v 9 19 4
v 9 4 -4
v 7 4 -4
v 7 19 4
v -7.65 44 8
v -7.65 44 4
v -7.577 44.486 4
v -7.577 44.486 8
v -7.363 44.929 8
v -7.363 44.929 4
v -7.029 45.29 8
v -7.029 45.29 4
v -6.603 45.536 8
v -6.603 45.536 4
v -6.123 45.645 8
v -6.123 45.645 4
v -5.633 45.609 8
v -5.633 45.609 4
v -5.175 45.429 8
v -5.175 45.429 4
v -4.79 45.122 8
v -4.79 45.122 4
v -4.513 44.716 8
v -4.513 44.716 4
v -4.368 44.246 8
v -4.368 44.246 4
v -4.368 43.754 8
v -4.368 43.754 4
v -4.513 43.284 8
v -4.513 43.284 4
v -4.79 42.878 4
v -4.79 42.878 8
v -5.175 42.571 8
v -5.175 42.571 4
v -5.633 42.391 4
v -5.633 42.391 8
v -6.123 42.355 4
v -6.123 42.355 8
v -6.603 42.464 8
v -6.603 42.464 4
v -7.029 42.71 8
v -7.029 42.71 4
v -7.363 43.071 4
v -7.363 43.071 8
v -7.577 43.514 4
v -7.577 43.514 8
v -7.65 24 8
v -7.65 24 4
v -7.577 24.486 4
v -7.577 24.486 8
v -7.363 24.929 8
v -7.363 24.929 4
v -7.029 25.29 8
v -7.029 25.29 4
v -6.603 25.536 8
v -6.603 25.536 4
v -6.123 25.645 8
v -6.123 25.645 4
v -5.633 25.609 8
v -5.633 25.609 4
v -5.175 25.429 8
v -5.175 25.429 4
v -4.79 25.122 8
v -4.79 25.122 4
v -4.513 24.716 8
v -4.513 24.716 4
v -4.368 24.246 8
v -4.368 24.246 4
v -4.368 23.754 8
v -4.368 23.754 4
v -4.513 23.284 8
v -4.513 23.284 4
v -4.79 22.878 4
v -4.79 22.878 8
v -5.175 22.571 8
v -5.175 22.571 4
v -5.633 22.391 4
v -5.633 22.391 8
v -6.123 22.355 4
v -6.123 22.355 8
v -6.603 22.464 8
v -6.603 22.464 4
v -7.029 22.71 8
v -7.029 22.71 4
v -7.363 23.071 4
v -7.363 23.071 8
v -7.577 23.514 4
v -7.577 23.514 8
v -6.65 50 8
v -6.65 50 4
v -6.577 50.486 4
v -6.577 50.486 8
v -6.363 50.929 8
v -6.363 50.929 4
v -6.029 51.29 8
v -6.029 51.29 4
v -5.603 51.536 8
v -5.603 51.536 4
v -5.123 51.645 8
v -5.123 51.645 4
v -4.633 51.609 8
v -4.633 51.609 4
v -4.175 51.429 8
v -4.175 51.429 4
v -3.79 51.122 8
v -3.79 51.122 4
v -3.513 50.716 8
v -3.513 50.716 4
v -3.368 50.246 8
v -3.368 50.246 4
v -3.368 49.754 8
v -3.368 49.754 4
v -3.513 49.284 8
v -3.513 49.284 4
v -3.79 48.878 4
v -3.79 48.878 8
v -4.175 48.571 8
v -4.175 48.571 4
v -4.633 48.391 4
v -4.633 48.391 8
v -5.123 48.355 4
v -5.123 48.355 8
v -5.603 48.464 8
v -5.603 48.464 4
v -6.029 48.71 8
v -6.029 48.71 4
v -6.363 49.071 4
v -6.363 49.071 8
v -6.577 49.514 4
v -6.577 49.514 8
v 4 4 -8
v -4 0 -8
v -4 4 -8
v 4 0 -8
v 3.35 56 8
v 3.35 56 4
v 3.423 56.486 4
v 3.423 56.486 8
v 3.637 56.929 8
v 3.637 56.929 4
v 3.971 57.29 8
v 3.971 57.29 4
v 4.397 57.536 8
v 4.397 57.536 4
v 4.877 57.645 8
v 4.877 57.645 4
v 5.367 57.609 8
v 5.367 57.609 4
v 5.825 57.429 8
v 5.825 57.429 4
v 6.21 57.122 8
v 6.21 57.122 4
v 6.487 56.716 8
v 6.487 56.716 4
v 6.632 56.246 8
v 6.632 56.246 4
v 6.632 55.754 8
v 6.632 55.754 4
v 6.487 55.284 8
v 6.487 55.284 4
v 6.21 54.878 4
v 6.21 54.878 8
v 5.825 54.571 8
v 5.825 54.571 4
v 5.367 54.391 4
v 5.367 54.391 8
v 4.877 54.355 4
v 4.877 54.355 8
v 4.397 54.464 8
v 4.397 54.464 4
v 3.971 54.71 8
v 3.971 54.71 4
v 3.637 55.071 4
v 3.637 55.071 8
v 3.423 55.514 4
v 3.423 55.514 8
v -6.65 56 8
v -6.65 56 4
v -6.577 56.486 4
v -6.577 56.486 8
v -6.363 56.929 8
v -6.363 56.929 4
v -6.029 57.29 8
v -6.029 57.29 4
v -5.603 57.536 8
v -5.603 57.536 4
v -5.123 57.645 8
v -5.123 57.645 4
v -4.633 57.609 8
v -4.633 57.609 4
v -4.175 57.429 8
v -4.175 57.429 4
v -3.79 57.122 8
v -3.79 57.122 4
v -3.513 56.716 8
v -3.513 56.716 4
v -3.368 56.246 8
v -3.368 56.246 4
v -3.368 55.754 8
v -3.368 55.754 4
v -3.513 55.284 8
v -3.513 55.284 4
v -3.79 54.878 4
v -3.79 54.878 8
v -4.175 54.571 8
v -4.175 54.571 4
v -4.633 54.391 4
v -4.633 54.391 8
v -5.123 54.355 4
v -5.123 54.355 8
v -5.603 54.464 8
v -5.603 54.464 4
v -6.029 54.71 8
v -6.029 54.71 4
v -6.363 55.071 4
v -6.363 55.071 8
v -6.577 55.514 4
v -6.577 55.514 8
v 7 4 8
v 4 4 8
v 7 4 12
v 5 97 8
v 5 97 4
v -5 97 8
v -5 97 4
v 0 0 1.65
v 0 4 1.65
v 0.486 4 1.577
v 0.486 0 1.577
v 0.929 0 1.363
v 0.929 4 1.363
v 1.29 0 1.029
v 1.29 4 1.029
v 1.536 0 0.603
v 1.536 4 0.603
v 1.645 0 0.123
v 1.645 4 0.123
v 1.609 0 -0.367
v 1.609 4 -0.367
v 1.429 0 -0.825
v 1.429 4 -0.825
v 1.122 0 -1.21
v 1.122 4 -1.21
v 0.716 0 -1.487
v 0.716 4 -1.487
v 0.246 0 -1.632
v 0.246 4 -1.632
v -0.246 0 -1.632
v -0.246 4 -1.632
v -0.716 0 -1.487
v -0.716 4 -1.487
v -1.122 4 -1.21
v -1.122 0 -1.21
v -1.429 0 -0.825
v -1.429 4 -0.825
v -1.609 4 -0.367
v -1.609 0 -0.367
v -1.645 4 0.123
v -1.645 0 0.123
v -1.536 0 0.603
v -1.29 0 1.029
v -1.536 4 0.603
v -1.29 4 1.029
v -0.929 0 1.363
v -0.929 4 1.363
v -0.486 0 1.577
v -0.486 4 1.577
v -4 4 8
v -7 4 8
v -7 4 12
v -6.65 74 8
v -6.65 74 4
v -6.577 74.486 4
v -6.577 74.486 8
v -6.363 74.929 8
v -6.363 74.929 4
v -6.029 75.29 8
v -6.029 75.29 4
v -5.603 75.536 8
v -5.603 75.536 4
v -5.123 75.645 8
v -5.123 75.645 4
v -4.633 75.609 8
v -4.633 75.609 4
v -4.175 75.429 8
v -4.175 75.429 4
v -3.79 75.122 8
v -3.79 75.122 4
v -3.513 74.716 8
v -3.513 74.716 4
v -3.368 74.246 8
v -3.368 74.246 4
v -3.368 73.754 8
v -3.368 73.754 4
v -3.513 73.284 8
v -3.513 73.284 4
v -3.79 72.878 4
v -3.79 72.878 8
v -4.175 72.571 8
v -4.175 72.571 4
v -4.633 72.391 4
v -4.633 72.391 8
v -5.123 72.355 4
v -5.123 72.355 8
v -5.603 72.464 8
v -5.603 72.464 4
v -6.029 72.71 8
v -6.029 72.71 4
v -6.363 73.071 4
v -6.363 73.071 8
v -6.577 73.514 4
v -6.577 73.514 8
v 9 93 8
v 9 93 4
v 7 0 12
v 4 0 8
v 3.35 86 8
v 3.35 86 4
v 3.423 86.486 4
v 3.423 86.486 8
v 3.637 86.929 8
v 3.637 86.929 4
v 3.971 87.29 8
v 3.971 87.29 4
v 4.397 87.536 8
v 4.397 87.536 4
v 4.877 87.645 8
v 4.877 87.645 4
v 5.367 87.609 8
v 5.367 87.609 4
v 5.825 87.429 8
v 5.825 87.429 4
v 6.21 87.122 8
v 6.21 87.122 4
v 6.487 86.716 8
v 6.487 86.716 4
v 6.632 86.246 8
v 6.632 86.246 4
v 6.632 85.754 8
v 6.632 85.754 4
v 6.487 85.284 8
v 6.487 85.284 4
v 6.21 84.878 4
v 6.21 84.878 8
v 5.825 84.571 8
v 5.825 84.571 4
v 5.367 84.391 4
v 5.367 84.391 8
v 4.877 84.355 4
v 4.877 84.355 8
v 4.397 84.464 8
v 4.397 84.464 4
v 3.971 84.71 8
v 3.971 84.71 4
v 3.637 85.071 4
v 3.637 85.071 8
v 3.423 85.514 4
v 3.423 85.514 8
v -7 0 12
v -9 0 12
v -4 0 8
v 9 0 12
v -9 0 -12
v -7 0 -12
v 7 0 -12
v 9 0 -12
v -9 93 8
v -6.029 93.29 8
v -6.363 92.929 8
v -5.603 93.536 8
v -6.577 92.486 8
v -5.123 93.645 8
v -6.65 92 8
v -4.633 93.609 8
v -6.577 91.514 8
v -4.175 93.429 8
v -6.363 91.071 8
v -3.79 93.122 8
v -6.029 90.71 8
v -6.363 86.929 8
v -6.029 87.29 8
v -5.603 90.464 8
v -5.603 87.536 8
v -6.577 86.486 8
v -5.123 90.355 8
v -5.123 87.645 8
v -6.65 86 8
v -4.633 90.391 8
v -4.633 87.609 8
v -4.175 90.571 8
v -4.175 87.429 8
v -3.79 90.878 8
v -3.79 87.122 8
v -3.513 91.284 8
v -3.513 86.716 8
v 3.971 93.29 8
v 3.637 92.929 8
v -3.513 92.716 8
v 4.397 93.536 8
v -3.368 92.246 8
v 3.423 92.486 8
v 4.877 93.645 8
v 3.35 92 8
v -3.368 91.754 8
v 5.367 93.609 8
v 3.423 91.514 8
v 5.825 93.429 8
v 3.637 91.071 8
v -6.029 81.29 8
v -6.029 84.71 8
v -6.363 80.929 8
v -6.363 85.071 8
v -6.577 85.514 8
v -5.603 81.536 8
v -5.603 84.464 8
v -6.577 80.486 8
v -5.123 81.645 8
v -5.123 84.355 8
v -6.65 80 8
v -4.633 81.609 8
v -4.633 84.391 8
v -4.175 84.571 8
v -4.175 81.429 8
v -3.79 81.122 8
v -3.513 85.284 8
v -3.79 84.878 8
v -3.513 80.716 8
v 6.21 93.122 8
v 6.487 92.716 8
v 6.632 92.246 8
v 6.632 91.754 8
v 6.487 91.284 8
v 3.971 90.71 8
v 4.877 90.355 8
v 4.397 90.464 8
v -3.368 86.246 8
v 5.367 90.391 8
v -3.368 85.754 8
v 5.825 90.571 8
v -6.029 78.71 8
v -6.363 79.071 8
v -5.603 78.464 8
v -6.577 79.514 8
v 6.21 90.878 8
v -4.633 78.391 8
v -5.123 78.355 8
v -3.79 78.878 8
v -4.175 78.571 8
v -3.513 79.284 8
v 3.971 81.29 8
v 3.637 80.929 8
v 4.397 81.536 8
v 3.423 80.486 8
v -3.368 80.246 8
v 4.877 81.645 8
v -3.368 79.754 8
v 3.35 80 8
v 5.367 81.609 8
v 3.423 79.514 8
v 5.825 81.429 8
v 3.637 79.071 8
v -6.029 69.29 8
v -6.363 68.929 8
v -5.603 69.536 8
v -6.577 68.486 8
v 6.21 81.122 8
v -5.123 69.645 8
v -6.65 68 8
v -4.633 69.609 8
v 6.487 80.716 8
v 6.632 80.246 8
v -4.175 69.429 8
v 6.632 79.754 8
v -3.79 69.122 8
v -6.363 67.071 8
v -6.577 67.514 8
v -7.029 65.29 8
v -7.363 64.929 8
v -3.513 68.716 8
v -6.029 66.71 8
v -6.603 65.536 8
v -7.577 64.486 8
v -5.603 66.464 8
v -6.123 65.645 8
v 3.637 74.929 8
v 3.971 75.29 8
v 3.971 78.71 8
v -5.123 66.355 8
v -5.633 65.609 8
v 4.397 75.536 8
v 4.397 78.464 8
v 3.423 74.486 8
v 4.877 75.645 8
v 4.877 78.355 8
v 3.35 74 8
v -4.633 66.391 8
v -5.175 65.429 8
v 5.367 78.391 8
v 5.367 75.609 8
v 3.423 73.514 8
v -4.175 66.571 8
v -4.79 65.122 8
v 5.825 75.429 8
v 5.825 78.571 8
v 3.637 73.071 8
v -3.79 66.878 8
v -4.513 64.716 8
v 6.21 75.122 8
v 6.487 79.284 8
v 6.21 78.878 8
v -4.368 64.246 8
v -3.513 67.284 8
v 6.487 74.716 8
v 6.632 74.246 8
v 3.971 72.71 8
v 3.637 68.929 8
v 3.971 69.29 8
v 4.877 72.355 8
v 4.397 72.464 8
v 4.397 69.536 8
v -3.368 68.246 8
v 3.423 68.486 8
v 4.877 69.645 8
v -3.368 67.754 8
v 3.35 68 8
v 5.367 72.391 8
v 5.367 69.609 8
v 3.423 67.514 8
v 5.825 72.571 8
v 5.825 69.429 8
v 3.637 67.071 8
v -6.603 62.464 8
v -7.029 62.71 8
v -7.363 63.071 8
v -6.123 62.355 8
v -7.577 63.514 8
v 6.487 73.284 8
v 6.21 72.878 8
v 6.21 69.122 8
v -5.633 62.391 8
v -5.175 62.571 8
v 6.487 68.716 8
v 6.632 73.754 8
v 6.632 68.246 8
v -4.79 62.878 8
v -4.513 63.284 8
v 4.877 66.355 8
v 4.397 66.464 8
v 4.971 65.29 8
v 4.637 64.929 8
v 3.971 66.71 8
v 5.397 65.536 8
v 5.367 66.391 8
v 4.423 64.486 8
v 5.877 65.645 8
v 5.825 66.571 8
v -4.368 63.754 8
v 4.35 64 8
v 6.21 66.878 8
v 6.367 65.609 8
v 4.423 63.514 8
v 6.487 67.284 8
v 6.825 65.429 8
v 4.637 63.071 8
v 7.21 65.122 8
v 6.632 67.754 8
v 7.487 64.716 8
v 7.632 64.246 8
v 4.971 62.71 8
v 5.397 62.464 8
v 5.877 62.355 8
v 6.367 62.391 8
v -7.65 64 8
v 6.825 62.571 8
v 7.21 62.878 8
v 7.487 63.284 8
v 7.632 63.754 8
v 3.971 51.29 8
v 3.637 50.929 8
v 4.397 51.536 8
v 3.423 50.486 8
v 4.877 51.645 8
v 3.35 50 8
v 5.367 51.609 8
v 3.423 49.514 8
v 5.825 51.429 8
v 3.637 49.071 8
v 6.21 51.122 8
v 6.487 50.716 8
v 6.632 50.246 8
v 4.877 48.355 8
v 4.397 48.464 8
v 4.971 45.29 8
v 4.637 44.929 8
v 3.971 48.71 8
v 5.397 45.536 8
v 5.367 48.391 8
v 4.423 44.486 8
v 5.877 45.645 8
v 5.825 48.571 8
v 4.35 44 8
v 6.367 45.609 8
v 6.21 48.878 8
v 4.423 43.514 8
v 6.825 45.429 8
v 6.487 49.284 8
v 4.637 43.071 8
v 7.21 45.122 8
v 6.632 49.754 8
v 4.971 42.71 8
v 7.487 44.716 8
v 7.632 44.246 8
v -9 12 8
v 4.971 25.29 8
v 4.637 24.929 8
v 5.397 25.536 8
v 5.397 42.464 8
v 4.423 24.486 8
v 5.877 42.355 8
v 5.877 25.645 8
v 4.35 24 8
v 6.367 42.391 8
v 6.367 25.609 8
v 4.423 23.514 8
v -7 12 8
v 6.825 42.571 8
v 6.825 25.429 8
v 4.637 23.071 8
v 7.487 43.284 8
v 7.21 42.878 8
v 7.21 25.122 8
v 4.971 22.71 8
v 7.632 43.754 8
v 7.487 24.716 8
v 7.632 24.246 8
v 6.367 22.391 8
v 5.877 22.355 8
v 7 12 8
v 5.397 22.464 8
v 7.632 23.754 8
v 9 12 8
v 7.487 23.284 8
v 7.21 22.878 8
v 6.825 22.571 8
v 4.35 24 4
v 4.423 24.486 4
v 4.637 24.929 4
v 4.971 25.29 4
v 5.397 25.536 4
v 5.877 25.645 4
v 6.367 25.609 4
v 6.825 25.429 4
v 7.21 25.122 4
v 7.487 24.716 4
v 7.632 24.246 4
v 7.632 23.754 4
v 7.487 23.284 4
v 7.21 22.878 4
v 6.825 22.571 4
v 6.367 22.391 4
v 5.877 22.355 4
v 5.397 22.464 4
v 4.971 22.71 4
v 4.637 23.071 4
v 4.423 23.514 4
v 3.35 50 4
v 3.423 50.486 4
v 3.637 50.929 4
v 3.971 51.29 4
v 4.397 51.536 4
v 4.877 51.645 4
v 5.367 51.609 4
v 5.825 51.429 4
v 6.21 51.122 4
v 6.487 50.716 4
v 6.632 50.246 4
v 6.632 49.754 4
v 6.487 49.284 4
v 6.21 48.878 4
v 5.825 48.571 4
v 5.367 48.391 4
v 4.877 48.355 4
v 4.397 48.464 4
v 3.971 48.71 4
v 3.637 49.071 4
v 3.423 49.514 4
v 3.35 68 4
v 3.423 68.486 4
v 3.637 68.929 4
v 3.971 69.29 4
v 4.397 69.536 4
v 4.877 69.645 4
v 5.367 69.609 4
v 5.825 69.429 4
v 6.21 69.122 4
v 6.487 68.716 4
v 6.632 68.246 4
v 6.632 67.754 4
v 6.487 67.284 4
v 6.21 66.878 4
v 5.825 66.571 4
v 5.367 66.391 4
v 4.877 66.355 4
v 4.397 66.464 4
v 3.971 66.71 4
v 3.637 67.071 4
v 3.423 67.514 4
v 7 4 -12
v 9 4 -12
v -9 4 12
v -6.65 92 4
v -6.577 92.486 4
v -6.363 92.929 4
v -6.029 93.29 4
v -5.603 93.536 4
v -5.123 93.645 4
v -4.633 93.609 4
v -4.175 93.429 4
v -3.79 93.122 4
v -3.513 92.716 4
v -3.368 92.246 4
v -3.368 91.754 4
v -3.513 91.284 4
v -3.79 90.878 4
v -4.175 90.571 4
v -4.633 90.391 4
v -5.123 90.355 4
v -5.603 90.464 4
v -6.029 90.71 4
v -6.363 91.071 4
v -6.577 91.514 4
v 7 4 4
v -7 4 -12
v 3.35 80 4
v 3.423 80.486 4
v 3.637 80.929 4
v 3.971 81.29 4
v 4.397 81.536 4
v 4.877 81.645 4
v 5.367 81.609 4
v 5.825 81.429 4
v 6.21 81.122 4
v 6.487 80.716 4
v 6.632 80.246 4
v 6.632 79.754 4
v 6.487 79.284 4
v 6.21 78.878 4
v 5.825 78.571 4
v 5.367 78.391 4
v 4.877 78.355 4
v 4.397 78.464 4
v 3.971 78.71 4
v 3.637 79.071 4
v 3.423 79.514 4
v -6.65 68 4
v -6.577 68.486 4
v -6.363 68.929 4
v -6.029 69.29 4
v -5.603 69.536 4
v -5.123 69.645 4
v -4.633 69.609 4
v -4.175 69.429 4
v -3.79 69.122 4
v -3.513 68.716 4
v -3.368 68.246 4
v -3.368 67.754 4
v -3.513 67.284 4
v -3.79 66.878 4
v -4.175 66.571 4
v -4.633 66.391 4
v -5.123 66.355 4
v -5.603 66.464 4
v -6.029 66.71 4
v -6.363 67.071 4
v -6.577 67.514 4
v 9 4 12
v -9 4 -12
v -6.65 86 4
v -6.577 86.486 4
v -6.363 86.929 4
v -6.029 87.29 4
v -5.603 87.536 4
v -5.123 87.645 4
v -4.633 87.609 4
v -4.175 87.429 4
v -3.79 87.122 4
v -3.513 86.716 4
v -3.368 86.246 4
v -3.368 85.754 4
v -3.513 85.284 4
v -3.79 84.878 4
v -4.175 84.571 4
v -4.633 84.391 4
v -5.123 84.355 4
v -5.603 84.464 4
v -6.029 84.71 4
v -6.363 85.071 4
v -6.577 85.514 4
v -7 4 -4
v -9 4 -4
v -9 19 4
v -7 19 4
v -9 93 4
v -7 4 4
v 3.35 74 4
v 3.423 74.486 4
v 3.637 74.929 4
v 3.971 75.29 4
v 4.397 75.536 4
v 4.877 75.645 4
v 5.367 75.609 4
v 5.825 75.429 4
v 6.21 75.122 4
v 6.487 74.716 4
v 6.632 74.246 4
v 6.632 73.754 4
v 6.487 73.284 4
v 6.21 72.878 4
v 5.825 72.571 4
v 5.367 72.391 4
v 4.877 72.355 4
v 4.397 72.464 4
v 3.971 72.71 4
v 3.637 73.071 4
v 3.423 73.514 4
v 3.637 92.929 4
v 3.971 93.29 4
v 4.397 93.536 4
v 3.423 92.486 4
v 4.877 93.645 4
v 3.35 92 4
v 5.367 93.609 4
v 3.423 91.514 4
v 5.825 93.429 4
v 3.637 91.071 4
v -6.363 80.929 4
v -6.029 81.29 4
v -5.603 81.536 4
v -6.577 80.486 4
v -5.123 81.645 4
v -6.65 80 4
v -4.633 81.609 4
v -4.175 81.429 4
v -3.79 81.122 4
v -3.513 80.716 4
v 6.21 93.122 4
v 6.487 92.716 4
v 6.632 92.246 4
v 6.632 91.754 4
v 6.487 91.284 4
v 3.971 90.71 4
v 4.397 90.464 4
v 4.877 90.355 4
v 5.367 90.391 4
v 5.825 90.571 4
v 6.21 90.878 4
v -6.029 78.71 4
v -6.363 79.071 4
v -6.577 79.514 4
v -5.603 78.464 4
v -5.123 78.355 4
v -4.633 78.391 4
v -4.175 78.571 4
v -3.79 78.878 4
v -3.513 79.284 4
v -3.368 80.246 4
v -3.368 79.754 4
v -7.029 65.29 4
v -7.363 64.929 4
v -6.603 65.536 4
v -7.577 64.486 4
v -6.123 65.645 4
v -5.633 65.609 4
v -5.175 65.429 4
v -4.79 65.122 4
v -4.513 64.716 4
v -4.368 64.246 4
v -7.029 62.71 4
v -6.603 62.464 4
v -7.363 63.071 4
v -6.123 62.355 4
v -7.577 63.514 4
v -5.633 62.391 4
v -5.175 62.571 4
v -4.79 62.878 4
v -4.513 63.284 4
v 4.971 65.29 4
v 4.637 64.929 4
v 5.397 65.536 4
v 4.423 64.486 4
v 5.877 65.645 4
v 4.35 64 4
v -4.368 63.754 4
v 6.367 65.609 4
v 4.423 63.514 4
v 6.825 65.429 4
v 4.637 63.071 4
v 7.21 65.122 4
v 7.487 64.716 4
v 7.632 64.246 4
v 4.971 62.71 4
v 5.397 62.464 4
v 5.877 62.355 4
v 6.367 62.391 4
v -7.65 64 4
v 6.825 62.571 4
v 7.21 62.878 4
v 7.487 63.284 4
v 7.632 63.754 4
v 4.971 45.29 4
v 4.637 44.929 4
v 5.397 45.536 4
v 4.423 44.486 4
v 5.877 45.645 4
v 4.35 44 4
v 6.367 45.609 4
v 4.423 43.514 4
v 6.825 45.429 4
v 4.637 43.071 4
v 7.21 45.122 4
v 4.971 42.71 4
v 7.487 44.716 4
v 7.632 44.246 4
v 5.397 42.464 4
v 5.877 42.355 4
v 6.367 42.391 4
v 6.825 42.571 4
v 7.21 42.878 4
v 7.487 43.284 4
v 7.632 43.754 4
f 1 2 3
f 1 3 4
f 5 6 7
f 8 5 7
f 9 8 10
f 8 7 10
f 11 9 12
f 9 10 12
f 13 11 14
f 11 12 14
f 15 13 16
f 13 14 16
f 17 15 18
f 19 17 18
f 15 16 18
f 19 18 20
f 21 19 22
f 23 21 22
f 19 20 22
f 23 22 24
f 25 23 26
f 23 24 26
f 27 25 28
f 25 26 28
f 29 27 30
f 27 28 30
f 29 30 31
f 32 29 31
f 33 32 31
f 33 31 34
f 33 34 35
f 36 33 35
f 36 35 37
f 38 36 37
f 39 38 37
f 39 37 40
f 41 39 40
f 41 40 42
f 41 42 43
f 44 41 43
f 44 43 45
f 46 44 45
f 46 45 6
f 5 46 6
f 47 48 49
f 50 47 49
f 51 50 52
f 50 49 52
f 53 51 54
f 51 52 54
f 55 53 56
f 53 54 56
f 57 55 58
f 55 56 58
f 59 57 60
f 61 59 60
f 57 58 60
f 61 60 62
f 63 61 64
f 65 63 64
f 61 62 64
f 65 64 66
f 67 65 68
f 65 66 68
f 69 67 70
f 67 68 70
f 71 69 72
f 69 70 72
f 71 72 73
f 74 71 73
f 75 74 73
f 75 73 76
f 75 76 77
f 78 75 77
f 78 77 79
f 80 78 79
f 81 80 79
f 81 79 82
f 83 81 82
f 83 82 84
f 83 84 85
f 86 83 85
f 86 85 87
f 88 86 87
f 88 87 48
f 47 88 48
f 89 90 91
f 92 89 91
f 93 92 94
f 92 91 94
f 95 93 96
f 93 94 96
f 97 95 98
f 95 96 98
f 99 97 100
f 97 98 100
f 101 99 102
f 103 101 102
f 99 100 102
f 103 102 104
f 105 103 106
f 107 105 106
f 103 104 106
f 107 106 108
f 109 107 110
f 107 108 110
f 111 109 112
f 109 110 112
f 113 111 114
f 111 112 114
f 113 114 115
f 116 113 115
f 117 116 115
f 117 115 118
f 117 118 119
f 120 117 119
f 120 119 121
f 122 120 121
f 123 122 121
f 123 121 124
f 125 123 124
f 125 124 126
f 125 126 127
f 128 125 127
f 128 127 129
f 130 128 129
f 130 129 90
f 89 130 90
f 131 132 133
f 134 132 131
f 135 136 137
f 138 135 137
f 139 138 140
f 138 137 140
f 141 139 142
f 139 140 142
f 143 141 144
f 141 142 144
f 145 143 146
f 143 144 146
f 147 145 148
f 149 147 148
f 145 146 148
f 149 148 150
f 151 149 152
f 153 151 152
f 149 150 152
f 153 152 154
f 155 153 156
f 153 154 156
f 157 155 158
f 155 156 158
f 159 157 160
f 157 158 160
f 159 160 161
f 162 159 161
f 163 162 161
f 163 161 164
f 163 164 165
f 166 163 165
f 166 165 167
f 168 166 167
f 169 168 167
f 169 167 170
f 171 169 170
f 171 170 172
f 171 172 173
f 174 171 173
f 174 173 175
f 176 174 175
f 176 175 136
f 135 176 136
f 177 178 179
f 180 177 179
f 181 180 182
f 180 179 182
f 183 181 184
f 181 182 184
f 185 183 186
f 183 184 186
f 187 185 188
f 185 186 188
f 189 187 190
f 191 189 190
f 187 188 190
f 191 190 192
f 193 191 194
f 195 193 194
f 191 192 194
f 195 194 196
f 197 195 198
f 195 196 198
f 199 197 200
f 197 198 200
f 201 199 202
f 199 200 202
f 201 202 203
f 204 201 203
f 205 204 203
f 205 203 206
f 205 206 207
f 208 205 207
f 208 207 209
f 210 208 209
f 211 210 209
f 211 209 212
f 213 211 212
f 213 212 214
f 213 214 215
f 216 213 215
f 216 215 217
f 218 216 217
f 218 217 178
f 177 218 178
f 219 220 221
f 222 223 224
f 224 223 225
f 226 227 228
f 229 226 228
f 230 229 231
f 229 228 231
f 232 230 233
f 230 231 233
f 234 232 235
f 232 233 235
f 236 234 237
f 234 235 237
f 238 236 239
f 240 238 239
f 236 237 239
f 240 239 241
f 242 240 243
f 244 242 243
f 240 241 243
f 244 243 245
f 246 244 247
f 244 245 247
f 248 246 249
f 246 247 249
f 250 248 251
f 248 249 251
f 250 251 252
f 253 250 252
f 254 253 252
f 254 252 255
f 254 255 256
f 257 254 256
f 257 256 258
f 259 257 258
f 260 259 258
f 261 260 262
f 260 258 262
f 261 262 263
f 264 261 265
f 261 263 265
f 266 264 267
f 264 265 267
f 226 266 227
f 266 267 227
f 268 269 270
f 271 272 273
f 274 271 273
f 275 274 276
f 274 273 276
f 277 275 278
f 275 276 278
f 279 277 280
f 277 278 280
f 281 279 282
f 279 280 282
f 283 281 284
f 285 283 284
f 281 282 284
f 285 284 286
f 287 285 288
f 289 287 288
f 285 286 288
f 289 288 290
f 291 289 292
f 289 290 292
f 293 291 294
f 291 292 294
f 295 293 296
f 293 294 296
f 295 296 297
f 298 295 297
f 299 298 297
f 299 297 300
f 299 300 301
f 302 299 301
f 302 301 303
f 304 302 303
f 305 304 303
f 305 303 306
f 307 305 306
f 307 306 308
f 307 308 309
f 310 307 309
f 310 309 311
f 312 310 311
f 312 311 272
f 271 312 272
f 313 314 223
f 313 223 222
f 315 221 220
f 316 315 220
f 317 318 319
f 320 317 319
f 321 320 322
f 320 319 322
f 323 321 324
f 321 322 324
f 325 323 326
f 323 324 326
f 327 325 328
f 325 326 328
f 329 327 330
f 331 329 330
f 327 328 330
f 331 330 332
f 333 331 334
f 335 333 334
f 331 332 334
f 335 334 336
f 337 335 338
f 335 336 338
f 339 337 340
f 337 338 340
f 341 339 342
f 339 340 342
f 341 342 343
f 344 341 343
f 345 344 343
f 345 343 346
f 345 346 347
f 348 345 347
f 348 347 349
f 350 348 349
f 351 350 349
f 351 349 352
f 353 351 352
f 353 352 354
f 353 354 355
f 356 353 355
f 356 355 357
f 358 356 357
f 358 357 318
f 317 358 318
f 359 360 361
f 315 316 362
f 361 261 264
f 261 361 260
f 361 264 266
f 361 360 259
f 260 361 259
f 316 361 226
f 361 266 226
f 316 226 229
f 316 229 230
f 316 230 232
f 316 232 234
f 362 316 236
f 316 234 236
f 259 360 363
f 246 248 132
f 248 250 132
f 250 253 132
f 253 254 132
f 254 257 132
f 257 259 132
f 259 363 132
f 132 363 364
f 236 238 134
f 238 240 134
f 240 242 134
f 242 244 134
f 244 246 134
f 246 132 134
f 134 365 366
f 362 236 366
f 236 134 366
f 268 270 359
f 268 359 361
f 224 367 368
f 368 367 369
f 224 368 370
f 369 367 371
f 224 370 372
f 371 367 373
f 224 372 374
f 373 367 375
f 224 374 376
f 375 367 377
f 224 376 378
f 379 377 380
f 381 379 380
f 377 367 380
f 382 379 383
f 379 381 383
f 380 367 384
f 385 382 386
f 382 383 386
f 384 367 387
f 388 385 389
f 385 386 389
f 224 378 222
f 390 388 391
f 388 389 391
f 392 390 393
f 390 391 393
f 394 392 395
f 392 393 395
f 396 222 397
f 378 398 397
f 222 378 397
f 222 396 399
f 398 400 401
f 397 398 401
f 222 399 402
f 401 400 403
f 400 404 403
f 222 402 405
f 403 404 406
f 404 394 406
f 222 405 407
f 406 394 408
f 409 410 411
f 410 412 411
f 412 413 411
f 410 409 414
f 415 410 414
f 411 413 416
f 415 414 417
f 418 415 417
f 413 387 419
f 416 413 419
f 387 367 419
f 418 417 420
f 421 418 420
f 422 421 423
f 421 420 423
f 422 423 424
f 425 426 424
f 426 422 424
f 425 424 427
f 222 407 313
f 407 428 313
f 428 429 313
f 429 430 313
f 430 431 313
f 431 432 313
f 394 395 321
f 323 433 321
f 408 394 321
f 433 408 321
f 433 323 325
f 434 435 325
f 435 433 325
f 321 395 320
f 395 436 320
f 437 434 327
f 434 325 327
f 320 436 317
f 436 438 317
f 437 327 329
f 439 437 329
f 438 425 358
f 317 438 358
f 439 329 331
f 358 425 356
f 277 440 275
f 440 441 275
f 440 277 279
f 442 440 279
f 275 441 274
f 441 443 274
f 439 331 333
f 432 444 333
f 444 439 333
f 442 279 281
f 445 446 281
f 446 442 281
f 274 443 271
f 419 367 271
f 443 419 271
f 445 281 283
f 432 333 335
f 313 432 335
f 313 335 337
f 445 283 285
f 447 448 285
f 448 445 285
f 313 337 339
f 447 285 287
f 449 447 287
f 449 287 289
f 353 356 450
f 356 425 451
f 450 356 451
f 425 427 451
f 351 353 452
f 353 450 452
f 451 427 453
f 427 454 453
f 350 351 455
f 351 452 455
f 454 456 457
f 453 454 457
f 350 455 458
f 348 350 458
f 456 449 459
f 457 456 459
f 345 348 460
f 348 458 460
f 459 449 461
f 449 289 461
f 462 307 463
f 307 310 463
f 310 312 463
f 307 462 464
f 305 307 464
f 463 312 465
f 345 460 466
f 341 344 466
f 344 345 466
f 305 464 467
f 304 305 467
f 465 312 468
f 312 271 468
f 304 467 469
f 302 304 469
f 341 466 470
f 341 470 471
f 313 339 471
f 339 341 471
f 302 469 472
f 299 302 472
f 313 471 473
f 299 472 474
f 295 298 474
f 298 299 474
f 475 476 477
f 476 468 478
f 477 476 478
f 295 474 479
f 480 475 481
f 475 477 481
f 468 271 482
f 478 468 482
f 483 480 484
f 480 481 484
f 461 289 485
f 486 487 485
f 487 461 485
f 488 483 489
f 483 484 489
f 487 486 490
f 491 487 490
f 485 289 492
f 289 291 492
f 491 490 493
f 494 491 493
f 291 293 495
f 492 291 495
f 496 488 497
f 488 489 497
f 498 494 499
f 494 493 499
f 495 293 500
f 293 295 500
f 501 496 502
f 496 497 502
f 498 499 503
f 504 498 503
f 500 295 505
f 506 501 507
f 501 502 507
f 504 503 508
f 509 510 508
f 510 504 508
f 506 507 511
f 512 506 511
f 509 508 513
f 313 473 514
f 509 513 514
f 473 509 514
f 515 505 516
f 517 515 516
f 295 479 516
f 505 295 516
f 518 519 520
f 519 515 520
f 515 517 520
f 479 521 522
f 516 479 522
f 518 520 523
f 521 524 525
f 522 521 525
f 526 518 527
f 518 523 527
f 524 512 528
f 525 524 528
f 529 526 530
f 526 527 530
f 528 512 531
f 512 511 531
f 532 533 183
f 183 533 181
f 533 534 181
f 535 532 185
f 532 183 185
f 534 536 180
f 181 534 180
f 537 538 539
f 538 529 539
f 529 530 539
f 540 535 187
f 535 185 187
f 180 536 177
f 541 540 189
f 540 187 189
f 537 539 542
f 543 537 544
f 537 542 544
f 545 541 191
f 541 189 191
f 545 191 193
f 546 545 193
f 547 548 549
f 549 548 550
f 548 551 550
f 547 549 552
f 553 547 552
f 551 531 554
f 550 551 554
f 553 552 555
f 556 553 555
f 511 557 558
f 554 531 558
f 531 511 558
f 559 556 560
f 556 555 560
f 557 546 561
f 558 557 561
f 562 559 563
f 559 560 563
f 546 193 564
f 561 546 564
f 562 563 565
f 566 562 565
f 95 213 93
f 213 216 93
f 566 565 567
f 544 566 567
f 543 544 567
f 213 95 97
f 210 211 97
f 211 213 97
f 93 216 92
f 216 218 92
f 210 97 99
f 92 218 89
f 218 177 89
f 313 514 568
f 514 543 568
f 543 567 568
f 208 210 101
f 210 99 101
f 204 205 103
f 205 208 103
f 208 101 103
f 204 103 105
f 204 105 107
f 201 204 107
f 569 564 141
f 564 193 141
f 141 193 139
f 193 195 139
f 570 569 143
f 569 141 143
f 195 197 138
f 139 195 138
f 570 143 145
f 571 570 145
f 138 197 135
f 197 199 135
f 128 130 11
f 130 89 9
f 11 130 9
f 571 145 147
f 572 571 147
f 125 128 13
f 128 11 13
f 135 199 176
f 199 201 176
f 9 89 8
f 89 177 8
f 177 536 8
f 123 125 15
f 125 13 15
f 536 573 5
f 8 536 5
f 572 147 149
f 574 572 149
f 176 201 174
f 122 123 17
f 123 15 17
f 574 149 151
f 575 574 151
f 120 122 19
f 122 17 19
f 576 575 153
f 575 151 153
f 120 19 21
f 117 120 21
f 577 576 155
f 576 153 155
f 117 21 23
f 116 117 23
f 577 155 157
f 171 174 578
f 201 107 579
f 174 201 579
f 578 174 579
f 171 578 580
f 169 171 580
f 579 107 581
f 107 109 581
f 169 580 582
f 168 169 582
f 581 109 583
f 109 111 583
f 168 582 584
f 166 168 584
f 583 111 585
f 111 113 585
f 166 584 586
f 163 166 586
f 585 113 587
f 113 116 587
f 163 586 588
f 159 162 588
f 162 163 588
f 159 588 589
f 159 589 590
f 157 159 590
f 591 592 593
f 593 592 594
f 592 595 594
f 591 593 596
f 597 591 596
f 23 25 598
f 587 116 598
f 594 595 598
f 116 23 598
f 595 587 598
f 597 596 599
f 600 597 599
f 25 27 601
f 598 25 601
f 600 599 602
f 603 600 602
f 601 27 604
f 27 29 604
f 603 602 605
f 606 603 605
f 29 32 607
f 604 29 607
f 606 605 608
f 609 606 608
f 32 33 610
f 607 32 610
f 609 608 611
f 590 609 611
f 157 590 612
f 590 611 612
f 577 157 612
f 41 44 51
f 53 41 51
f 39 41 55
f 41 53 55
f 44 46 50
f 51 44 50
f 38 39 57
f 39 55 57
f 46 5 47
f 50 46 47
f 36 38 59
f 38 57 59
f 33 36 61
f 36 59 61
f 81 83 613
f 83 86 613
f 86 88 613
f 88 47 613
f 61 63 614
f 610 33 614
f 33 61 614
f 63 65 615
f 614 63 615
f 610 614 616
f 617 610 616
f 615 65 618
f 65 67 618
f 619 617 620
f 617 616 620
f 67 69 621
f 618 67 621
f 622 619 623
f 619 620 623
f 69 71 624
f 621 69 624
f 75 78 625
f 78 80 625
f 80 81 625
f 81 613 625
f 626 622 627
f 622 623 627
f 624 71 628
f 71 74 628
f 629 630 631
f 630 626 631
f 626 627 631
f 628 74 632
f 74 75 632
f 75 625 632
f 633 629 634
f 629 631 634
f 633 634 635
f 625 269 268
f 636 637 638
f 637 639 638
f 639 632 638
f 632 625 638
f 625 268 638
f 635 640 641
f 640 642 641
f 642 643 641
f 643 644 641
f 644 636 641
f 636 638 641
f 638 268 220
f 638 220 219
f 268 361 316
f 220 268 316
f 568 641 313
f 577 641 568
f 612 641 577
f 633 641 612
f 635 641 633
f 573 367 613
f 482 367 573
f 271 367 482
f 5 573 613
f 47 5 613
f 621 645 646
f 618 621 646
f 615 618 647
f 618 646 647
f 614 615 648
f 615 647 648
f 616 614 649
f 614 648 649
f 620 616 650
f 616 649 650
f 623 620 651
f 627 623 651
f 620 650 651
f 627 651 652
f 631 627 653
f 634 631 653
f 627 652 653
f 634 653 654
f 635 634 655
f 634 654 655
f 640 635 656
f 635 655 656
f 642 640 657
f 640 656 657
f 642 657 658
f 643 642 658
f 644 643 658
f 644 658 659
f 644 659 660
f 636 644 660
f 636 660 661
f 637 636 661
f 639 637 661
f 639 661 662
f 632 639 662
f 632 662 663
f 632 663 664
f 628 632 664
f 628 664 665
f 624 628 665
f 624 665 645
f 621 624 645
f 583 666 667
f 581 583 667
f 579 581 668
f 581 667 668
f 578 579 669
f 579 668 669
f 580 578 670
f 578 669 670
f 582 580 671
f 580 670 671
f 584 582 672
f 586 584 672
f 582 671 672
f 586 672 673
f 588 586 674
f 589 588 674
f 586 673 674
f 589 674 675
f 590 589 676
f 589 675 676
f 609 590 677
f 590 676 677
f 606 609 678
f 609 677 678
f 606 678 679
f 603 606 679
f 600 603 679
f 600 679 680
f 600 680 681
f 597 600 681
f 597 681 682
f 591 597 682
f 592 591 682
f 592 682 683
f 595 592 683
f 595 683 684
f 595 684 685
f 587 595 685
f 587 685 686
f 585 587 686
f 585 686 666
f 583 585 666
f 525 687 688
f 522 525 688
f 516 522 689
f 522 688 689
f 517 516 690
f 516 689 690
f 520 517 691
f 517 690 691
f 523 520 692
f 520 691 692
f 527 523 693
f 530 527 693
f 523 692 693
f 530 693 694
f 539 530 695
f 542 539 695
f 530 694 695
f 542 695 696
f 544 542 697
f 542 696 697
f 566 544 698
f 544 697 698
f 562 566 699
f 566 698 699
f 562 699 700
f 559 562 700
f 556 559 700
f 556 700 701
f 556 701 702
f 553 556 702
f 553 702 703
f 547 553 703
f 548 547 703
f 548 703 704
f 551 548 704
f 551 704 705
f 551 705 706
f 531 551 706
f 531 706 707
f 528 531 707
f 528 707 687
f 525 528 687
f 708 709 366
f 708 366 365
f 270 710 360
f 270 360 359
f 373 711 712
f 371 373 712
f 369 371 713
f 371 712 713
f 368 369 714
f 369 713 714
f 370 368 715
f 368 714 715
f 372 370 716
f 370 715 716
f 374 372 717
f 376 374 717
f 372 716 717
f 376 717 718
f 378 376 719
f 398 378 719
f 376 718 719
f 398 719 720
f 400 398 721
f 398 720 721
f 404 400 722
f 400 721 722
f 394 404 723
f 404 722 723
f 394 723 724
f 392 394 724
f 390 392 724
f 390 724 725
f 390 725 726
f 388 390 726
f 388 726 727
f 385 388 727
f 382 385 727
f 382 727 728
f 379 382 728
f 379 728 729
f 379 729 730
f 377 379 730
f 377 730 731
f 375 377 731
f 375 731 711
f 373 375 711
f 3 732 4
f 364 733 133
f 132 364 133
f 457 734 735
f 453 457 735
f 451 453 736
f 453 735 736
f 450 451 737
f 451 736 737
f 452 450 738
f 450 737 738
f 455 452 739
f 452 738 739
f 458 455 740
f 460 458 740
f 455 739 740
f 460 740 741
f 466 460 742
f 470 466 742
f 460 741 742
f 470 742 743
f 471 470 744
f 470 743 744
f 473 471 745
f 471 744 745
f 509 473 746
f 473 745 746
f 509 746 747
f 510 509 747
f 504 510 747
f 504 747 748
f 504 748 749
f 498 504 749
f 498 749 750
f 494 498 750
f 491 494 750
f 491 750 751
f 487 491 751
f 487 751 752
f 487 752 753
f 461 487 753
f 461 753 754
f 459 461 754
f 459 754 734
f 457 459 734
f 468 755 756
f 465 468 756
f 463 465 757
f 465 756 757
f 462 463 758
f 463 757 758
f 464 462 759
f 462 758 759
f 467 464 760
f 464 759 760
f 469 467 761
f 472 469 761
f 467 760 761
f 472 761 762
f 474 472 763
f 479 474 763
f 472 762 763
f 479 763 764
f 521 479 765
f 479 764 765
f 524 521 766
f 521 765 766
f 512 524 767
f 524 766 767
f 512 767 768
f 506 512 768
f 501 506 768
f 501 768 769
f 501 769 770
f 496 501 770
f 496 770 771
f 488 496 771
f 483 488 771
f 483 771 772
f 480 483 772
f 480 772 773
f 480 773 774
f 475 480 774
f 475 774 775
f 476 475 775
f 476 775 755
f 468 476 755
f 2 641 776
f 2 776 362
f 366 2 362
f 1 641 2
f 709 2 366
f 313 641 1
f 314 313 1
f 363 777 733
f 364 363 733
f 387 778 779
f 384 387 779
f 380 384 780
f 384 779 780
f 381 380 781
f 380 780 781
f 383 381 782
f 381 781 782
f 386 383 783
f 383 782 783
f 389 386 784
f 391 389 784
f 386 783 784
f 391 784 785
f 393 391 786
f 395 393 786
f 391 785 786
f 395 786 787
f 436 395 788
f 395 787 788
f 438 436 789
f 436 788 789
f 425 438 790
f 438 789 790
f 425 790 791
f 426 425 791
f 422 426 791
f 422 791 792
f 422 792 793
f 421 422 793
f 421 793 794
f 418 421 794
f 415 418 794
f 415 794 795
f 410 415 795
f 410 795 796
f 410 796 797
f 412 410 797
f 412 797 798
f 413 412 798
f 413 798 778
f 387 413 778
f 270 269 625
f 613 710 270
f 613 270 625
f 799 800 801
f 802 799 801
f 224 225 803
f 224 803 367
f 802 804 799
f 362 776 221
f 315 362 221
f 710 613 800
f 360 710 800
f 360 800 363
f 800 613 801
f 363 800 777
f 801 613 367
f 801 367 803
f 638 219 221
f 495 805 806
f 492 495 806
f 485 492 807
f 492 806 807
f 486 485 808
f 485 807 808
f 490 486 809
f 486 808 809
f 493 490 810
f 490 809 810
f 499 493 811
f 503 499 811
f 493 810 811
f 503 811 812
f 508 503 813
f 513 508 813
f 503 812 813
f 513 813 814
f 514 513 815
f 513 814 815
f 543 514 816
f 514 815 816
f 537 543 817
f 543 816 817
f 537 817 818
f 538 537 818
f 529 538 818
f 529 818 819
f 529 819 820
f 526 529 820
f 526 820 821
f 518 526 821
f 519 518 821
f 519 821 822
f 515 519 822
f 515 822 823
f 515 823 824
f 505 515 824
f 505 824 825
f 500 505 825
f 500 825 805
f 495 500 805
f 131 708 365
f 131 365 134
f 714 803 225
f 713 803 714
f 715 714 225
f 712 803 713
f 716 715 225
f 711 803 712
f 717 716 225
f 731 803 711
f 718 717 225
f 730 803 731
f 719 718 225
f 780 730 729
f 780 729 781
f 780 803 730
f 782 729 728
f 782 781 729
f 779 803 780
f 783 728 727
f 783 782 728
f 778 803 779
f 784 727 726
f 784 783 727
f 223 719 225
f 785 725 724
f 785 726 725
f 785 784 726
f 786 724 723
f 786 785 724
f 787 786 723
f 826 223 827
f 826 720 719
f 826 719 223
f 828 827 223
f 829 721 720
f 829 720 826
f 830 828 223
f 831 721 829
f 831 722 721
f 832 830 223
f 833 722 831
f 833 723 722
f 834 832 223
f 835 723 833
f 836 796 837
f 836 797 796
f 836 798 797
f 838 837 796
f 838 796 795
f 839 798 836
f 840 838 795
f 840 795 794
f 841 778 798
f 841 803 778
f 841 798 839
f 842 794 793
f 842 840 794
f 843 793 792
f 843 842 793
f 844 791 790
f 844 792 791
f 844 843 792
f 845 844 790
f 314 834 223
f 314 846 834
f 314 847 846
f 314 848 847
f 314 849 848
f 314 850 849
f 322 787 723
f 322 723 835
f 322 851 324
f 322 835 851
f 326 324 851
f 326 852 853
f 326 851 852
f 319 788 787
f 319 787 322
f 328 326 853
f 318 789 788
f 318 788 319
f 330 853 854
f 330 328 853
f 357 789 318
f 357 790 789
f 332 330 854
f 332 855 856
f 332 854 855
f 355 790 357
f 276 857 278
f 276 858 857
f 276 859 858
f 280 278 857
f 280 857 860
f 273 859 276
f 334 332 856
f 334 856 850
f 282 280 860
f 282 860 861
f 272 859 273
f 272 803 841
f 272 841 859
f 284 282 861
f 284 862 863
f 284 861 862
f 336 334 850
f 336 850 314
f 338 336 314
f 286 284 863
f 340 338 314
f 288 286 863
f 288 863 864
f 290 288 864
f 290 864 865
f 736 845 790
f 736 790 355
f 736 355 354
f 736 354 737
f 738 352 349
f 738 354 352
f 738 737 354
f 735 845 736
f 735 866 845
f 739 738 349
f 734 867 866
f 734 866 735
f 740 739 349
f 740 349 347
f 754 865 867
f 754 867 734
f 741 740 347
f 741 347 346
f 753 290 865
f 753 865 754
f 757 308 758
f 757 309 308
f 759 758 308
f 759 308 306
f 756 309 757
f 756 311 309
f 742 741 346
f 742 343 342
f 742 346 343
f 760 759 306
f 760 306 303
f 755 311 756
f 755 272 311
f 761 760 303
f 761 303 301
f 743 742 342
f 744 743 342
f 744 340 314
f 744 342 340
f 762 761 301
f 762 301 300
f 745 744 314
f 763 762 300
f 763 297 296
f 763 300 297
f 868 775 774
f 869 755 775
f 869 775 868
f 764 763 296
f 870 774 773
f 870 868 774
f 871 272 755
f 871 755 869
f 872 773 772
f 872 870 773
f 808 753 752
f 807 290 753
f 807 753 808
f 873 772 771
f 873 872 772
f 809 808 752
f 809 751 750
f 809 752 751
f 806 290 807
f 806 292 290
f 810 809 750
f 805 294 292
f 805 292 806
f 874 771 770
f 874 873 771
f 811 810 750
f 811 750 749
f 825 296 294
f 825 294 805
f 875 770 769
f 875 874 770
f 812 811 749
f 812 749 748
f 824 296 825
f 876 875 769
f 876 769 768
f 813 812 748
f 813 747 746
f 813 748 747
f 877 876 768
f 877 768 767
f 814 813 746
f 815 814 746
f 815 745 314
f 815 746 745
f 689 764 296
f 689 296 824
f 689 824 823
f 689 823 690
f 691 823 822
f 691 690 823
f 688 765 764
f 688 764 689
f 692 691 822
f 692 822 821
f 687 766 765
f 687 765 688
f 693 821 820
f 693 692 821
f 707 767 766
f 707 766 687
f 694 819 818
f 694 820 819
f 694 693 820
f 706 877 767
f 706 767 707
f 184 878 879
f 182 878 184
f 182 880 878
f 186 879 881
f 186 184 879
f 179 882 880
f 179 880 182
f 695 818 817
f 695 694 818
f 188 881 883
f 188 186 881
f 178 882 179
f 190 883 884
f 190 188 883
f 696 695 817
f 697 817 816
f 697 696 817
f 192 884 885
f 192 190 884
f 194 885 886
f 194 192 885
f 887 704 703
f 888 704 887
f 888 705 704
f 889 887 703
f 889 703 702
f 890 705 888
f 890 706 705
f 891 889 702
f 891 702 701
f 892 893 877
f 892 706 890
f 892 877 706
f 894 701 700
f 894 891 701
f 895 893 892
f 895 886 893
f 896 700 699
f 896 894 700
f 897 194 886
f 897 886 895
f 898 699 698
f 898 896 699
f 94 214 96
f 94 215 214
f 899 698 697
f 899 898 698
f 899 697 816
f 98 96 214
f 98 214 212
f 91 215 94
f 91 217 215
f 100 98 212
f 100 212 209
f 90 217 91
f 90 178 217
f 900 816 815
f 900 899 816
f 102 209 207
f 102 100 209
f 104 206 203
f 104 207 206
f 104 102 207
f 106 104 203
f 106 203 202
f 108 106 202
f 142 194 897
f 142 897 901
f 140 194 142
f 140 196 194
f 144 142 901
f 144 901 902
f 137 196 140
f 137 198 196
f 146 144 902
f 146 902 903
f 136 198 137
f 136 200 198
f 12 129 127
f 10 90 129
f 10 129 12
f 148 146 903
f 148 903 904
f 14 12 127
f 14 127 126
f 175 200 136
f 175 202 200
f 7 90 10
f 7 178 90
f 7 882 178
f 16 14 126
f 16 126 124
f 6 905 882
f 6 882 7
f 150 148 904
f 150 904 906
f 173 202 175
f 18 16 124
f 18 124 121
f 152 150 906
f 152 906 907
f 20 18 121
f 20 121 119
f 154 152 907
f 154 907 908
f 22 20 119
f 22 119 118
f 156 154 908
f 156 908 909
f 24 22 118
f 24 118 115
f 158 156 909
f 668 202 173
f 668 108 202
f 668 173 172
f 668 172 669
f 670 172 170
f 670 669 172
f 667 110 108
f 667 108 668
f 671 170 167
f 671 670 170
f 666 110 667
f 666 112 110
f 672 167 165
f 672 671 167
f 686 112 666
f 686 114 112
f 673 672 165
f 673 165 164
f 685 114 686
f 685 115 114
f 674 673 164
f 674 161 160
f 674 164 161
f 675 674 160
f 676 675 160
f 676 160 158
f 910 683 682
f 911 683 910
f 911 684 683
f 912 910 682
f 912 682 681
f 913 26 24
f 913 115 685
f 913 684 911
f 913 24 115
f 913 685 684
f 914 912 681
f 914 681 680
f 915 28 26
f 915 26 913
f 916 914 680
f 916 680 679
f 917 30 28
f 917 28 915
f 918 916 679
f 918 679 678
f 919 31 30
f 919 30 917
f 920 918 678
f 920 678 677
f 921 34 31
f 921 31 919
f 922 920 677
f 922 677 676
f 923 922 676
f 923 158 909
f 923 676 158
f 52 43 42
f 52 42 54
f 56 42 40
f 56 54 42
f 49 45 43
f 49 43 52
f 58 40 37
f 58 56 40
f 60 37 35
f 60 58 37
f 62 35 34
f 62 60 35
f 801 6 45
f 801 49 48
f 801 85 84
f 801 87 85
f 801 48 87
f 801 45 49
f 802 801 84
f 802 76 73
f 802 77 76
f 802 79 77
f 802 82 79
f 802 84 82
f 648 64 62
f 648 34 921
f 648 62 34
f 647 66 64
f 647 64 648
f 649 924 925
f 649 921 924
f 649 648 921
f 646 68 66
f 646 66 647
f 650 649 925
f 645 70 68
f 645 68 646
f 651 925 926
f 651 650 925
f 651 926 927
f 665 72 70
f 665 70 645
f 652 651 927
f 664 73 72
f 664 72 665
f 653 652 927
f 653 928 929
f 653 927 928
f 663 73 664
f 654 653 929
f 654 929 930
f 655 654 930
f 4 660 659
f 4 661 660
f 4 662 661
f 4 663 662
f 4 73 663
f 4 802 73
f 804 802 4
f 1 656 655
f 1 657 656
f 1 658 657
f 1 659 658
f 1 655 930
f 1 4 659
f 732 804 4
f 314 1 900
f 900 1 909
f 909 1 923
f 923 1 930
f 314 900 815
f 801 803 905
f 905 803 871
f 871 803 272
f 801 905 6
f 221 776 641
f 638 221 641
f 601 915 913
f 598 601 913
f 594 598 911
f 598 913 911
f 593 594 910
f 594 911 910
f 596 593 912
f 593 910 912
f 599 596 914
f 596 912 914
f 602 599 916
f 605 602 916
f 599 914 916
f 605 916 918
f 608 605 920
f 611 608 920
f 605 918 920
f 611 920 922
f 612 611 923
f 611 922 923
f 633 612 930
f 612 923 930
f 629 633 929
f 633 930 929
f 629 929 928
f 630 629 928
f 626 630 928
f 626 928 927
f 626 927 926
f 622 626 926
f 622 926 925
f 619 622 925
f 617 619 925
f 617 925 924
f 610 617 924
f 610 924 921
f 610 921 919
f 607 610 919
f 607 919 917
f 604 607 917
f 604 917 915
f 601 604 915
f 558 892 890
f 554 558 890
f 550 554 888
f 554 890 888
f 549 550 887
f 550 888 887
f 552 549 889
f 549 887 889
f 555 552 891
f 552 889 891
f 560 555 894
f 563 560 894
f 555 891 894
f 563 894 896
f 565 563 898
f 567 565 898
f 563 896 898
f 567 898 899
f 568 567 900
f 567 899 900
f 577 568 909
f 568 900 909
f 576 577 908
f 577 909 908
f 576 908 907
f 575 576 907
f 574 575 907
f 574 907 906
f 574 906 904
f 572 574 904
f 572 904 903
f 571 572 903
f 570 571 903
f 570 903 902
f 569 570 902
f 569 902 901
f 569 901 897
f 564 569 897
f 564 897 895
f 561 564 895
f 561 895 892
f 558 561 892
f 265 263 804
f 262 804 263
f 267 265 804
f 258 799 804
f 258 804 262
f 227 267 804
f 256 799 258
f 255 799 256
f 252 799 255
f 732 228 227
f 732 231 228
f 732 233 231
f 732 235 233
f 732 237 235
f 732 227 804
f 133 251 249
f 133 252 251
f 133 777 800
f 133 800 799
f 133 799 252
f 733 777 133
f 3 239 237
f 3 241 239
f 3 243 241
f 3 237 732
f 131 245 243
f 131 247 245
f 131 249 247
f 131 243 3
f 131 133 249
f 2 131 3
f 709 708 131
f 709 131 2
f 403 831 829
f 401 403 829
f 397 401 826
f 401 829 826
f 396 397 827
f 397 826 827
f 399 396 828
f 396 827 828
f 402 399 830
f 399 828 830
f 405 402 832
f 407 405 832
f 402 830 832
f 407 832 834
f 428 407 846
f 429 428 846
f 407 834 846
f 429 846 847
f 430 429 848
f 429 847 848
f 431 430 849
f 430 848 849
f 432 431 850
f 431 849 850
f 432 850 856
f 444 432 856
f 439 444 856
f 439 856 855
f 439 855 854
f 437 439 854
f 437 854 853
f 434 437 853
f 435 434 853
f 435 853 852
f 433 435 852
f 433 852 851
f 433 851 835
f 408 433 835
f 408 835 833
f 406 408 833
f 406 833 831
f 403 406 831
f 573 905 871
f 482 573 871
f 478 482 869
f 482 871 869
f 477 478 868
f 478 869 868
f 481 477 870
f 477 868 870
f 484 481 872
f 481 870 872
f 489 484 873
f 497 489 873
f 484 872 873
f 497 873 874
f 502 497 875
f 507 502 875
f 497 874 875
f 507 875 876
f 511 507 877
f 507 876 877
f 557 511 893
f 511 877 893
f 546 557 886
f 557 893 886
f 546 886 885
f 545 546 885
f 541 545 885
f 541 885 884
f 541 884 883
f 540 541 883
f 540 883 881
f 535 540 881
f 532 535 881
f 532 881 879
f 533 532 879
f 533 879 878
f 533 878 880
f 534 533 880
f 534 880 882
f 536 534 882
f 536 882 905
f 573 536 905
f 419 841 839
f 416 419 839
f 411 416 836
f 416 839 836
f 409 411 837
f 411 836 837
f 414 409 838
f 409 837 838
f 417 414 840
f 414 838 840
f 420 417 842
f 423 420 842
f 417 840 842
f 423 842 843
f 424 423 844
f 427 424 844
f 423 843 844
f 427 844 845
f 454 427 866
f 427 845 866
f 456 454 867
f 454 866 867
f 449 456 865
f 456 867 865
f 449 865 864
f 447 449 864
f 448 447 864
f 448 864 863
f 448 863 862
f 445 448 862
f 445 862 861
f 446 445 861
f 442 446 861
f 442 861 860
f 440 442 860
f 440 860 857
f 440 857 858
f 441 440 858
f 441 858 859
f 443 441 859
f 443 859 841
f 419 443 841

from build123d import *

# Parameters (mm, degrees)
SKETCH_1_W          = 18
SKETCH_1_H          = 16
EXTRUDE_1_DEPTH     = 4
SKETCH_2_R          = 1.65
CUT_EXTRUDE_1_DEPTH = 4
EXTRUDE_2_DEPTH     = 4
SKETCH_4_W          = 18
SKETCH_4_H          = 4
EXTRUDE_3_DEPTH     = 100
EXTRUDE_4_DEPTH     = 2
SKETCH_6_R          = 1.65
CUT_EXTRUDE_2_DEPTH = 10
SKETCH_7_W          = 18
SKETCH_7_H          = 7
CUT_EXTRUDE_3_DEPTH = 10
CHAMFER_1_SIZE      = 4


with BuildPart() as part:
    # 草图1 → 凸台-拉伸1 (new body)
    with BuildSketch(Plane(origin=(0, 0, 0), x_dir=(1, 0, 0), z_dir=(0, 1, 0))):
        Rectangle(SKETCH_1_W, SKETCH_1_H)
    extrude(amount=EXTRUDE_1_DEPTH)

    # 草图2 → 切除-拉伸1 (cut)
    with BuildSketch(Plane(origin=(0, 4, 0), x_dir=(1, 0, 0), z_dir=(0, 1, 0))):
        with Locations(Location((0, 0, 0), (0, 0, 270))):
            Circle(SKETCH_2_R)
    extrude(amount=-CUT_EXTRUDE_1_DEPTH, mode=Mode.SUBTRACT)

    # 草图3 → 凸台-拉伸2 (add)
    with BuildSketch(Plane(origin=(0, 4, 0), x_dir=(1, 0, 0), z_dir=(0, 1, 0))):
        Polygon((-9, -8), (-9, -12), (-7, -12), (-4, -8), align=None)
        Polygon((7, -12), (4, -8), (9, -8), (9, -12), align=None)
        Polygon((9, 12), (7, 12), (4, 8), (9, 8), align=None)
        Polygon((-7, 12), (-4, 8), (-9, 8), (-9, 12), align=None)
    extrude(amount=-EXTRUDE_2_DEPTH)

    # 草图4 → 凸台-拉伸3 (add)
    with BuildSketch(Plane(origin=(0, 4, 0), x_dir=(1, 0, 0), z_dir=(0, 1, 0))):
        with Locations((0, -6)):
            Rectangle(SKETCH_4_W, SKETCH_4_H)
    extrude(amount=EXTRUDE_3_DEPTH)

    # 草图5 → 凸台-拉伸4 (add)
    with BuildSketch(Plane(origin=(9, 0, 0), x_dir=(0, 0, -1), z_dir=(1, 0, 0))):
        Polygon((-4, 19), (-4, 4), (4, 4), align=None)
        Polygon((-8, 12), (-8, 4), (-12, 4), align=None)
    extrude_4 = extrude(amount=-EXTRUDE_4_DEPTH)

    # 镜向1: 凸台-拉伸4 across plane
    add(extrude_4.mirror(Plane(origin=(0, 0, 0), x_dir=(0, 0, 1), z_dir=(1, 0, 0))))

    # 草图6 → 切除-拉伸2 (cut)
    with BuildSketch(Plane(origin=(0, 0, 4), x_dir=(-1, 0, 0), z_dir=(0, 0, -1))):
        with Locations((-6, 44)):
            Circle(SKETCH_6_R)
        with Locations((6, 44)):
            Circle(SKETCH_6_R)
        with Locations((6, 64)):
            Circle(SKETCH_6_R)
        with Locations((-6, 64)):
            Circle(SKETCH_6_R)
        with Locations((6, 24)):
            Circle(SKETCH_6_R)
        with Locations((-6, 24)):
            Circle(SKETCH_6_R)
        with Locations((5, 92)):
            Circle(SKETCH_6_R)
        with Locations((5, 86)):
            Circle(SKETCH_6_R)
        with Locations((5, 80)):
            Circle(SKETCH_6_R)
        with Locations((5, 74)):
            Circle(SKETCH_6_R)
        with Locations((5, 68)):
            Circle(SKETCH_6_R)
        with Locations((5, 56)):
            Circle(SKETCH_6_R)
        with Locations((5, 50)):
            Circle(SKETCH_6_R)
        with Locations((-5, 50)):
            Circle(SKETCH_6_R)
        with Locations((-5, 56)):
            Circle(SKETCH_6_R)
        with Locations((-5, 68)):
            Circle(SKETCH_6_R)
        with Locations((-5, 74)):
            Circle(SKETCH_6_R)
        with Locations((-5, 80)):
            Circle(SKETCH_6_R)
        with Locations((-5, 86)):
            Circle(SKETCH_6_R)
        with Locations((-5, 92)):
            Circle(SKETCH_6_R)
    extrude(amount=-CUT_EXTRUDE_2_DEPTH, mode=Mode.SUBTRACT)

    # 草图7 → 切除-拉伸3 (cut)
    with BuildSketch(Plane(origin=(0, 0, 4), x_dir=(-1, 0, 0), z_dir=(0, 0, -1))):
        with Locations((0, 100.5)):
            Rectangle(SKETCH_7_W, SKETCH_7_H)
    extrude(amount=-CUT_EXTRUDE_3_DEPTH, mode=Mode.SUBTRACT)

    # 倒角1
    chamfer_1_edges = [part.edges().sort_by_distance(p)[0] for p in [
        (-9, 97, 6),
        (9, 97, 6),
    ]]
    chamfer(chamfer_1_edges, length=CHAMFER_1_SIZE)


solid = part.part
